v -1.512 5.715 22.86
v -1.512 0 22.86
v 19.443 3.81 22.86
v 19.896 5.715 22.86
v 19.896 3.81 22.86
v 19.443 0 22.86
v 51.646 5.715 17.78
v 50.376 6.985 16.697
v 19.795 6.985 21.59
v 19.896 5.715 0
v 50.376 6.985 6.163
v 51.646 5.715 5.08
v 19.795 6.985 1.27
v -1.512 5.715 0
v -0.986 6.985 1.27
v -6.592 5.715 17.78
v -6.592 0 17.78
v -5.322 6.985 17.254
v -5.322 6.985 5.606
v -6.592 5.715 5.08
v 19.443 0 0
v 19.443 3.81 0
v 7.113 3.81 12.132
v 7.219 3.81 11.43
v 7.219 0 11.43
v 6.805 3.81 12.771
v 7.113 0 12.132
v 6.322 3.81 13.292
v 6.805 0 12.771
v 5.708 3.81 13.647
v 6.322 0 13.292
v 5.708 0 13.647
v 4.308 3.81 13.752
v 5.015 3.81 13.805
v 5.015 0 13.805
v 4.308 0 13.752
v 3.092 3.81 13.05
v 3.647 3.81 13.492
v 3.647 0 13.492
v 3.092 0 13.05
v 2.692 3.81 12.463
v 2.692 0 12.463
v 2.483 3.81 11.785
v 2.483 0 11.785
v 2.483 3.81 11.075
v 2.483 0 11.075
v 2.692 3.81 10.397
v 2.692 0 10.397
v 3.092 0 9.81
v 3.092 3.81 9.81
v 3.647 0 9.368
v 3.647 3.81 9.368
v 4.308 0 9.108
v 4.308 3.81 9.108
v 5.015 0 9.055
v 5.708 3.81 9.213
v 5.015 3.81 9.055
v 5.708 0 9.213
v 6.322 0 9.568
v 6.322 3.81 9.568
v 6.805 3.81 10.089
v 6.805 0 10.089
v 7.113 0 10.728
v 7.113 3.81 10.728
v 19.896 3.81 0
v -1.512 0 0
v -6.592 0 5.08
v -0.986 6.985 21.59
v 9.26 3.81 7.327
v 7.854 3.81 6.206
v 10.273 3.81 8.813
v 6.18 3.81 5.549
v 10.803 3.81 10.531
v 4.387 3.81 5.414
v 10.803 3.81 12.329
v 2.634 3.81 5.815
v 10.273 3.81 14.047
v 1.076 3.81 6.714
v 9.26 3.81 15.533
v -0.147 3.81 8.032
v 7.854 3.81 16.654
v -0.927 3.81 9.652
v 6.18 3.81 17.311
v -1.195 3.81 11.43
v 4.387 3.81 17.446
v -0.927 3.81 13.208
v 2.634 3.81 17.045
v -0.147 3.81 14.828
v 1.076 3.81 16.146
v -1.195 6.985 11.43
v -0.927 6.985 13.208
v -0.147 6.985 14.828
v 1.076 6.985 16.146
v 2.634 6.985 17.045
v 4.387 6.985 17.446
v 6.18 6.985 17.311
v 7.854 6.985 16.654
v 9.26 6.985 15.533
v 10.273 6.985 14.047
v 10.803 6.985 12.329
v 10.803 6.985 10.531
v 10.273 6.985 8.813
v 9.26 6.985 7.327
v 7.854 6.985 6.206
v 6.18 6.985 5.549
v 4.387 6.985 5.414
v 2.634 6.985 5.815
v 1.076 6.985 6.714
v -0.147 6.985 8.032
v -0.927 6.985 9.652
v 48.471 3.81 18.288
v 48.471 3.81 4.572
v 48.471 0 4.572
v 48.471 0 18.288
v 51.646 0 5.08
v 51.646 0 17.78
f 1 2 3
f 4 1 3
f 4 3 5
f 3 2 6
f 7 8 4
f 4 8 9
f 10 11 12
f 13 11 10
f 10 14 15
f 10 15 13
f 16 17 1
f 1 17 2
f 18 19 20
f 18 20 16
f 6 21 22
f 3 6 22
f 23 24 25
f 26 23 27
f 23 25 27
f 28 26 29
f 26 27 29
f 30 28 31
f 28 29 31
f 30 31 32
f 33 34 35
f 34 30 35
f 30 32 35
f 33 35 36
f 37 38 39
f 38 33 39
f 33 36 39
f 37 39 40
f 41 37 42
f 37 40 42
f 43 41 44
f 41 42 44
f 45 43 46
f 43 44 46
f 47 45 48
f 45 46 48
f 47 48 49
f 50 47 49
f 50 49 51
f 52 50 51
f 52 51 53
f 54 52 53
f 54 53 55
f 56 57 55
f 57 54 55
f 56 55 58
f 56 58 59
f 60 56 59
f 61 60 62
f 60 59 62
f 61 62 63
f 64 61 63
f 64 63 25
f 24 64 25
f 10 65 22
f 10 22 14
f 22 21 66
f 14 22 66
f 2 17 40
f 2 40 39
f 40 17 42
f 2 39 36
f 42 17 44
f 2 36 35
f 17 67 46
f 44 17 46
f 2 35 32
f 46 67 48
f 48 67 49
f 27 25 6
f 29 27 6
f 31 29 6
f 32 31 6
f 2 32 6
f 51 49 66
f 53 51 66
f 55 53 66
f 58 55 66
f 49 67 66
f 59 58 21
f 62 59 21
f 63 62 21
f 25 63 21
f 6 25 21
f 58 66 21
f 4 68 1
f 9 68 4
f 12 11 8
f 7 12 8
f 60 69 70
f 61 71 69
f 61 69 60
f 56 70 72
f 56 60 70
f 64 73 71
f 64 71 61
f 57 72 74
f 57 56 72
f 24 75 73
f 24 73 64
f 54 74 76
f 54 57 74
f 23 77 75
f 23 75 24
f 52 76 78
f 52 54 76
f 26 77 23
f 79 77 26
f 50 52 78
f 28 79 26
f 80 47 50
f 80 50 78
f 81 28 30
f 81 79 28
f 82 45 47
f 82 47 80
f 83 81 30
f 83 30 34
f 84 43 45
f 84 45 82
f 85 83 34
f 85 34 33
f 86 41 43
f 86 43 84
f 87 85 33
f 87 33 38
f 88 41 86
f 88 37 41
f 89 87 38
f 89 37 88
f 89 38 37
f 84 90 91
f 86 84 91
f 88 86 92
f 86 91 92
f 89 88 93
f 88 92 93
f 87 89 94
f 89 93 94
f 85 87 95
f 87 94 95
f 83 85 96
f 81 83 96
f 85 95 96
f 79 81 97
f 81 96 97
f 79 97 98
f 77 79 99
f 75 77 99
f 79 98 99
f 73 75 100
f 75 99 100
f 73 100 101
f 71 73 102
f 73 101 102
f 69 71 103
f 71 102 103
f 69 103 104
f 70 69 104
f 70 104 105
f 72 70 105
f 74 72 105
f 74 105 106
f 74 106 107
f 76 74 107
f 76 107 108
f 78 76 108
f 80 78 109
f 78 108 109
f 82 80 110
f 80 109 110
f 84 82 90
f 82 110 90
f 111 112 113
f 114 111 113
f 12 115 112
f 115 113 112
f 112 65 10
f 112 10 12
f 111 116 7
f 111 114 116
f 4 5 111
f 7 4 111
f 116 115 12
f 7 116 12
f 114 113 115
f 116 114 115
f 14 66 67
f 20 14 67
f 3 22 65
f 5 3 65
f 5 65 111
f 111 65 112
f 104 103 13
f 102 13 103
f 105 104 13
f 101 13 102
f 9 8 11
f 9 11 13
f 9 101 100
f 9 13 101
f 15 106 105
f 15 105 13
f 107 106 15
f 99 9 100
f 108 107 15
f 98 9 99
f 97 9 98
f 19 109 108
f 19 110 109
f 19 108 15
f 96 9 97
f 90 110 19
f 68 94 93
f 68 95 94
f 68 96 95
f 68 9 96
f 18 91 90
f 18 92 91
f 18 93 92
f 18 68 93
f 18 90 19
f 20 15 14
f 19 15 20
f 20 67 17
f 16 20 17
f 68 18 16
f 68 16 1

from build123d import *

# Parameters (mm, degrees)
F1_DEPTH  = 22.86
F2_SIZE2  = 31.75
F2_SIZE   = 5.08
F3_SIZE   = 5.08
F5_DEPTH  = 3.81
F6_SIZE   = 1.27
F7_R      = 2.38125
F8_DEPTH  = 25.4
F9_R      = 6.0325
F9_R_2    = 2.38125
F10_DEPTH = 3.175


with BuildPart() as f1:
    # F0 (on Top) → F1 (new body)
    with BuildSketch(Plane.XY):
        Polygon((-6.5924515948, 3.175), (-6.5924515948, 0), (19.4425484052, 0), (19.4425484052, 3.81), (48.4711198338, 3.81), (48.4711198338, 0), (51.6461198338, 0), (51.6461198338, 6.985), (16.2675484052, 6.985), (16.2675484052, 3.175), align=None)
    extrude(amount=F1_DEPTH)

    # F2
    f2_edges = [f1.edges().sort_by_distance(p)[0] for p in [
        (51.64612, 3.4925, 22.86),
        (51.64612, 3.4925, 0),
    ]]
    f2_side = f1.faces().sort_by_distance((51.64612, 3.4925, 11.43))[0]
    chamfer(f2_edges, length=F2_SIZE, length2=F2_SIZE2, reference=f2_side)

    # F3
    f3_edges = [f1.edges().sort_by_distance(p)[0] for p in [
        (-6.592452, 1.5875, 0),
        (-6.592452, 1.5875, 22.86),
    ]]
    chamfer(f3_edges, length=F3_SIZE)

    # F4 (on face) → F5 (join, through all)
    with BuildSketch(Plane(origin=(0, 3.175, 0), x_dir=(-1, 0, 0), z_dir=(0, 1, 0))):
        Polygon((1.5124515948, 0), (6.5924515948, 5.08), (6.5924515948, 17.78), (1.5124515948, 22.86), (-16.2675484052, 22.86), (-16.2675484052, 0), align=None)
    extrude(amount=F5_DEPTH)

    # F6
    f6_edges = [f1.edges().sort_by_distance(p)[0] for p in [
        (51.64612, 6.985, 11.43),
        (35.77112, 6.985, 20.32),
        (9.191834, 6.985, 22.86),
        (-4.052452, 6.985, 20.32),
        (-6.592452, 6.985, 11.43),
        (-4.052452, 6.985, 2.54),
        (9.191834, 6.985, 0),
        (35.77112, 6.985, 2.54),
    ]]
    chamfer(f6_edges, length=F6_SIZE)

    # F7 (on face) → F8 (cut)
    with BuildSketch(Plane.XZ):
        with Locations((4.8375484052, 11.43)):
            Circle(F7_R)
    extrude(amount=-F8_DEPTH, mode=Mode.SUBTRACT)

    # F9 (on face) → F10 (cut)
    with BuildSketch(Plane(origin=(0, 6.985, 0), x_dir=(-1, 0, 0), z_dir=(0, 1, 0))):
        with Locations((-4.8375484052, 11.43)):
            Circle(F9_R)
        with Locations((-4.8375484052, 11.43)):
            Circle(F9_R_2, mode=Mode.SUBTRACT)
    extrude(amount=-F10_DEPTH, mode=Mode.SUBTRACT)


solid = f1.part
